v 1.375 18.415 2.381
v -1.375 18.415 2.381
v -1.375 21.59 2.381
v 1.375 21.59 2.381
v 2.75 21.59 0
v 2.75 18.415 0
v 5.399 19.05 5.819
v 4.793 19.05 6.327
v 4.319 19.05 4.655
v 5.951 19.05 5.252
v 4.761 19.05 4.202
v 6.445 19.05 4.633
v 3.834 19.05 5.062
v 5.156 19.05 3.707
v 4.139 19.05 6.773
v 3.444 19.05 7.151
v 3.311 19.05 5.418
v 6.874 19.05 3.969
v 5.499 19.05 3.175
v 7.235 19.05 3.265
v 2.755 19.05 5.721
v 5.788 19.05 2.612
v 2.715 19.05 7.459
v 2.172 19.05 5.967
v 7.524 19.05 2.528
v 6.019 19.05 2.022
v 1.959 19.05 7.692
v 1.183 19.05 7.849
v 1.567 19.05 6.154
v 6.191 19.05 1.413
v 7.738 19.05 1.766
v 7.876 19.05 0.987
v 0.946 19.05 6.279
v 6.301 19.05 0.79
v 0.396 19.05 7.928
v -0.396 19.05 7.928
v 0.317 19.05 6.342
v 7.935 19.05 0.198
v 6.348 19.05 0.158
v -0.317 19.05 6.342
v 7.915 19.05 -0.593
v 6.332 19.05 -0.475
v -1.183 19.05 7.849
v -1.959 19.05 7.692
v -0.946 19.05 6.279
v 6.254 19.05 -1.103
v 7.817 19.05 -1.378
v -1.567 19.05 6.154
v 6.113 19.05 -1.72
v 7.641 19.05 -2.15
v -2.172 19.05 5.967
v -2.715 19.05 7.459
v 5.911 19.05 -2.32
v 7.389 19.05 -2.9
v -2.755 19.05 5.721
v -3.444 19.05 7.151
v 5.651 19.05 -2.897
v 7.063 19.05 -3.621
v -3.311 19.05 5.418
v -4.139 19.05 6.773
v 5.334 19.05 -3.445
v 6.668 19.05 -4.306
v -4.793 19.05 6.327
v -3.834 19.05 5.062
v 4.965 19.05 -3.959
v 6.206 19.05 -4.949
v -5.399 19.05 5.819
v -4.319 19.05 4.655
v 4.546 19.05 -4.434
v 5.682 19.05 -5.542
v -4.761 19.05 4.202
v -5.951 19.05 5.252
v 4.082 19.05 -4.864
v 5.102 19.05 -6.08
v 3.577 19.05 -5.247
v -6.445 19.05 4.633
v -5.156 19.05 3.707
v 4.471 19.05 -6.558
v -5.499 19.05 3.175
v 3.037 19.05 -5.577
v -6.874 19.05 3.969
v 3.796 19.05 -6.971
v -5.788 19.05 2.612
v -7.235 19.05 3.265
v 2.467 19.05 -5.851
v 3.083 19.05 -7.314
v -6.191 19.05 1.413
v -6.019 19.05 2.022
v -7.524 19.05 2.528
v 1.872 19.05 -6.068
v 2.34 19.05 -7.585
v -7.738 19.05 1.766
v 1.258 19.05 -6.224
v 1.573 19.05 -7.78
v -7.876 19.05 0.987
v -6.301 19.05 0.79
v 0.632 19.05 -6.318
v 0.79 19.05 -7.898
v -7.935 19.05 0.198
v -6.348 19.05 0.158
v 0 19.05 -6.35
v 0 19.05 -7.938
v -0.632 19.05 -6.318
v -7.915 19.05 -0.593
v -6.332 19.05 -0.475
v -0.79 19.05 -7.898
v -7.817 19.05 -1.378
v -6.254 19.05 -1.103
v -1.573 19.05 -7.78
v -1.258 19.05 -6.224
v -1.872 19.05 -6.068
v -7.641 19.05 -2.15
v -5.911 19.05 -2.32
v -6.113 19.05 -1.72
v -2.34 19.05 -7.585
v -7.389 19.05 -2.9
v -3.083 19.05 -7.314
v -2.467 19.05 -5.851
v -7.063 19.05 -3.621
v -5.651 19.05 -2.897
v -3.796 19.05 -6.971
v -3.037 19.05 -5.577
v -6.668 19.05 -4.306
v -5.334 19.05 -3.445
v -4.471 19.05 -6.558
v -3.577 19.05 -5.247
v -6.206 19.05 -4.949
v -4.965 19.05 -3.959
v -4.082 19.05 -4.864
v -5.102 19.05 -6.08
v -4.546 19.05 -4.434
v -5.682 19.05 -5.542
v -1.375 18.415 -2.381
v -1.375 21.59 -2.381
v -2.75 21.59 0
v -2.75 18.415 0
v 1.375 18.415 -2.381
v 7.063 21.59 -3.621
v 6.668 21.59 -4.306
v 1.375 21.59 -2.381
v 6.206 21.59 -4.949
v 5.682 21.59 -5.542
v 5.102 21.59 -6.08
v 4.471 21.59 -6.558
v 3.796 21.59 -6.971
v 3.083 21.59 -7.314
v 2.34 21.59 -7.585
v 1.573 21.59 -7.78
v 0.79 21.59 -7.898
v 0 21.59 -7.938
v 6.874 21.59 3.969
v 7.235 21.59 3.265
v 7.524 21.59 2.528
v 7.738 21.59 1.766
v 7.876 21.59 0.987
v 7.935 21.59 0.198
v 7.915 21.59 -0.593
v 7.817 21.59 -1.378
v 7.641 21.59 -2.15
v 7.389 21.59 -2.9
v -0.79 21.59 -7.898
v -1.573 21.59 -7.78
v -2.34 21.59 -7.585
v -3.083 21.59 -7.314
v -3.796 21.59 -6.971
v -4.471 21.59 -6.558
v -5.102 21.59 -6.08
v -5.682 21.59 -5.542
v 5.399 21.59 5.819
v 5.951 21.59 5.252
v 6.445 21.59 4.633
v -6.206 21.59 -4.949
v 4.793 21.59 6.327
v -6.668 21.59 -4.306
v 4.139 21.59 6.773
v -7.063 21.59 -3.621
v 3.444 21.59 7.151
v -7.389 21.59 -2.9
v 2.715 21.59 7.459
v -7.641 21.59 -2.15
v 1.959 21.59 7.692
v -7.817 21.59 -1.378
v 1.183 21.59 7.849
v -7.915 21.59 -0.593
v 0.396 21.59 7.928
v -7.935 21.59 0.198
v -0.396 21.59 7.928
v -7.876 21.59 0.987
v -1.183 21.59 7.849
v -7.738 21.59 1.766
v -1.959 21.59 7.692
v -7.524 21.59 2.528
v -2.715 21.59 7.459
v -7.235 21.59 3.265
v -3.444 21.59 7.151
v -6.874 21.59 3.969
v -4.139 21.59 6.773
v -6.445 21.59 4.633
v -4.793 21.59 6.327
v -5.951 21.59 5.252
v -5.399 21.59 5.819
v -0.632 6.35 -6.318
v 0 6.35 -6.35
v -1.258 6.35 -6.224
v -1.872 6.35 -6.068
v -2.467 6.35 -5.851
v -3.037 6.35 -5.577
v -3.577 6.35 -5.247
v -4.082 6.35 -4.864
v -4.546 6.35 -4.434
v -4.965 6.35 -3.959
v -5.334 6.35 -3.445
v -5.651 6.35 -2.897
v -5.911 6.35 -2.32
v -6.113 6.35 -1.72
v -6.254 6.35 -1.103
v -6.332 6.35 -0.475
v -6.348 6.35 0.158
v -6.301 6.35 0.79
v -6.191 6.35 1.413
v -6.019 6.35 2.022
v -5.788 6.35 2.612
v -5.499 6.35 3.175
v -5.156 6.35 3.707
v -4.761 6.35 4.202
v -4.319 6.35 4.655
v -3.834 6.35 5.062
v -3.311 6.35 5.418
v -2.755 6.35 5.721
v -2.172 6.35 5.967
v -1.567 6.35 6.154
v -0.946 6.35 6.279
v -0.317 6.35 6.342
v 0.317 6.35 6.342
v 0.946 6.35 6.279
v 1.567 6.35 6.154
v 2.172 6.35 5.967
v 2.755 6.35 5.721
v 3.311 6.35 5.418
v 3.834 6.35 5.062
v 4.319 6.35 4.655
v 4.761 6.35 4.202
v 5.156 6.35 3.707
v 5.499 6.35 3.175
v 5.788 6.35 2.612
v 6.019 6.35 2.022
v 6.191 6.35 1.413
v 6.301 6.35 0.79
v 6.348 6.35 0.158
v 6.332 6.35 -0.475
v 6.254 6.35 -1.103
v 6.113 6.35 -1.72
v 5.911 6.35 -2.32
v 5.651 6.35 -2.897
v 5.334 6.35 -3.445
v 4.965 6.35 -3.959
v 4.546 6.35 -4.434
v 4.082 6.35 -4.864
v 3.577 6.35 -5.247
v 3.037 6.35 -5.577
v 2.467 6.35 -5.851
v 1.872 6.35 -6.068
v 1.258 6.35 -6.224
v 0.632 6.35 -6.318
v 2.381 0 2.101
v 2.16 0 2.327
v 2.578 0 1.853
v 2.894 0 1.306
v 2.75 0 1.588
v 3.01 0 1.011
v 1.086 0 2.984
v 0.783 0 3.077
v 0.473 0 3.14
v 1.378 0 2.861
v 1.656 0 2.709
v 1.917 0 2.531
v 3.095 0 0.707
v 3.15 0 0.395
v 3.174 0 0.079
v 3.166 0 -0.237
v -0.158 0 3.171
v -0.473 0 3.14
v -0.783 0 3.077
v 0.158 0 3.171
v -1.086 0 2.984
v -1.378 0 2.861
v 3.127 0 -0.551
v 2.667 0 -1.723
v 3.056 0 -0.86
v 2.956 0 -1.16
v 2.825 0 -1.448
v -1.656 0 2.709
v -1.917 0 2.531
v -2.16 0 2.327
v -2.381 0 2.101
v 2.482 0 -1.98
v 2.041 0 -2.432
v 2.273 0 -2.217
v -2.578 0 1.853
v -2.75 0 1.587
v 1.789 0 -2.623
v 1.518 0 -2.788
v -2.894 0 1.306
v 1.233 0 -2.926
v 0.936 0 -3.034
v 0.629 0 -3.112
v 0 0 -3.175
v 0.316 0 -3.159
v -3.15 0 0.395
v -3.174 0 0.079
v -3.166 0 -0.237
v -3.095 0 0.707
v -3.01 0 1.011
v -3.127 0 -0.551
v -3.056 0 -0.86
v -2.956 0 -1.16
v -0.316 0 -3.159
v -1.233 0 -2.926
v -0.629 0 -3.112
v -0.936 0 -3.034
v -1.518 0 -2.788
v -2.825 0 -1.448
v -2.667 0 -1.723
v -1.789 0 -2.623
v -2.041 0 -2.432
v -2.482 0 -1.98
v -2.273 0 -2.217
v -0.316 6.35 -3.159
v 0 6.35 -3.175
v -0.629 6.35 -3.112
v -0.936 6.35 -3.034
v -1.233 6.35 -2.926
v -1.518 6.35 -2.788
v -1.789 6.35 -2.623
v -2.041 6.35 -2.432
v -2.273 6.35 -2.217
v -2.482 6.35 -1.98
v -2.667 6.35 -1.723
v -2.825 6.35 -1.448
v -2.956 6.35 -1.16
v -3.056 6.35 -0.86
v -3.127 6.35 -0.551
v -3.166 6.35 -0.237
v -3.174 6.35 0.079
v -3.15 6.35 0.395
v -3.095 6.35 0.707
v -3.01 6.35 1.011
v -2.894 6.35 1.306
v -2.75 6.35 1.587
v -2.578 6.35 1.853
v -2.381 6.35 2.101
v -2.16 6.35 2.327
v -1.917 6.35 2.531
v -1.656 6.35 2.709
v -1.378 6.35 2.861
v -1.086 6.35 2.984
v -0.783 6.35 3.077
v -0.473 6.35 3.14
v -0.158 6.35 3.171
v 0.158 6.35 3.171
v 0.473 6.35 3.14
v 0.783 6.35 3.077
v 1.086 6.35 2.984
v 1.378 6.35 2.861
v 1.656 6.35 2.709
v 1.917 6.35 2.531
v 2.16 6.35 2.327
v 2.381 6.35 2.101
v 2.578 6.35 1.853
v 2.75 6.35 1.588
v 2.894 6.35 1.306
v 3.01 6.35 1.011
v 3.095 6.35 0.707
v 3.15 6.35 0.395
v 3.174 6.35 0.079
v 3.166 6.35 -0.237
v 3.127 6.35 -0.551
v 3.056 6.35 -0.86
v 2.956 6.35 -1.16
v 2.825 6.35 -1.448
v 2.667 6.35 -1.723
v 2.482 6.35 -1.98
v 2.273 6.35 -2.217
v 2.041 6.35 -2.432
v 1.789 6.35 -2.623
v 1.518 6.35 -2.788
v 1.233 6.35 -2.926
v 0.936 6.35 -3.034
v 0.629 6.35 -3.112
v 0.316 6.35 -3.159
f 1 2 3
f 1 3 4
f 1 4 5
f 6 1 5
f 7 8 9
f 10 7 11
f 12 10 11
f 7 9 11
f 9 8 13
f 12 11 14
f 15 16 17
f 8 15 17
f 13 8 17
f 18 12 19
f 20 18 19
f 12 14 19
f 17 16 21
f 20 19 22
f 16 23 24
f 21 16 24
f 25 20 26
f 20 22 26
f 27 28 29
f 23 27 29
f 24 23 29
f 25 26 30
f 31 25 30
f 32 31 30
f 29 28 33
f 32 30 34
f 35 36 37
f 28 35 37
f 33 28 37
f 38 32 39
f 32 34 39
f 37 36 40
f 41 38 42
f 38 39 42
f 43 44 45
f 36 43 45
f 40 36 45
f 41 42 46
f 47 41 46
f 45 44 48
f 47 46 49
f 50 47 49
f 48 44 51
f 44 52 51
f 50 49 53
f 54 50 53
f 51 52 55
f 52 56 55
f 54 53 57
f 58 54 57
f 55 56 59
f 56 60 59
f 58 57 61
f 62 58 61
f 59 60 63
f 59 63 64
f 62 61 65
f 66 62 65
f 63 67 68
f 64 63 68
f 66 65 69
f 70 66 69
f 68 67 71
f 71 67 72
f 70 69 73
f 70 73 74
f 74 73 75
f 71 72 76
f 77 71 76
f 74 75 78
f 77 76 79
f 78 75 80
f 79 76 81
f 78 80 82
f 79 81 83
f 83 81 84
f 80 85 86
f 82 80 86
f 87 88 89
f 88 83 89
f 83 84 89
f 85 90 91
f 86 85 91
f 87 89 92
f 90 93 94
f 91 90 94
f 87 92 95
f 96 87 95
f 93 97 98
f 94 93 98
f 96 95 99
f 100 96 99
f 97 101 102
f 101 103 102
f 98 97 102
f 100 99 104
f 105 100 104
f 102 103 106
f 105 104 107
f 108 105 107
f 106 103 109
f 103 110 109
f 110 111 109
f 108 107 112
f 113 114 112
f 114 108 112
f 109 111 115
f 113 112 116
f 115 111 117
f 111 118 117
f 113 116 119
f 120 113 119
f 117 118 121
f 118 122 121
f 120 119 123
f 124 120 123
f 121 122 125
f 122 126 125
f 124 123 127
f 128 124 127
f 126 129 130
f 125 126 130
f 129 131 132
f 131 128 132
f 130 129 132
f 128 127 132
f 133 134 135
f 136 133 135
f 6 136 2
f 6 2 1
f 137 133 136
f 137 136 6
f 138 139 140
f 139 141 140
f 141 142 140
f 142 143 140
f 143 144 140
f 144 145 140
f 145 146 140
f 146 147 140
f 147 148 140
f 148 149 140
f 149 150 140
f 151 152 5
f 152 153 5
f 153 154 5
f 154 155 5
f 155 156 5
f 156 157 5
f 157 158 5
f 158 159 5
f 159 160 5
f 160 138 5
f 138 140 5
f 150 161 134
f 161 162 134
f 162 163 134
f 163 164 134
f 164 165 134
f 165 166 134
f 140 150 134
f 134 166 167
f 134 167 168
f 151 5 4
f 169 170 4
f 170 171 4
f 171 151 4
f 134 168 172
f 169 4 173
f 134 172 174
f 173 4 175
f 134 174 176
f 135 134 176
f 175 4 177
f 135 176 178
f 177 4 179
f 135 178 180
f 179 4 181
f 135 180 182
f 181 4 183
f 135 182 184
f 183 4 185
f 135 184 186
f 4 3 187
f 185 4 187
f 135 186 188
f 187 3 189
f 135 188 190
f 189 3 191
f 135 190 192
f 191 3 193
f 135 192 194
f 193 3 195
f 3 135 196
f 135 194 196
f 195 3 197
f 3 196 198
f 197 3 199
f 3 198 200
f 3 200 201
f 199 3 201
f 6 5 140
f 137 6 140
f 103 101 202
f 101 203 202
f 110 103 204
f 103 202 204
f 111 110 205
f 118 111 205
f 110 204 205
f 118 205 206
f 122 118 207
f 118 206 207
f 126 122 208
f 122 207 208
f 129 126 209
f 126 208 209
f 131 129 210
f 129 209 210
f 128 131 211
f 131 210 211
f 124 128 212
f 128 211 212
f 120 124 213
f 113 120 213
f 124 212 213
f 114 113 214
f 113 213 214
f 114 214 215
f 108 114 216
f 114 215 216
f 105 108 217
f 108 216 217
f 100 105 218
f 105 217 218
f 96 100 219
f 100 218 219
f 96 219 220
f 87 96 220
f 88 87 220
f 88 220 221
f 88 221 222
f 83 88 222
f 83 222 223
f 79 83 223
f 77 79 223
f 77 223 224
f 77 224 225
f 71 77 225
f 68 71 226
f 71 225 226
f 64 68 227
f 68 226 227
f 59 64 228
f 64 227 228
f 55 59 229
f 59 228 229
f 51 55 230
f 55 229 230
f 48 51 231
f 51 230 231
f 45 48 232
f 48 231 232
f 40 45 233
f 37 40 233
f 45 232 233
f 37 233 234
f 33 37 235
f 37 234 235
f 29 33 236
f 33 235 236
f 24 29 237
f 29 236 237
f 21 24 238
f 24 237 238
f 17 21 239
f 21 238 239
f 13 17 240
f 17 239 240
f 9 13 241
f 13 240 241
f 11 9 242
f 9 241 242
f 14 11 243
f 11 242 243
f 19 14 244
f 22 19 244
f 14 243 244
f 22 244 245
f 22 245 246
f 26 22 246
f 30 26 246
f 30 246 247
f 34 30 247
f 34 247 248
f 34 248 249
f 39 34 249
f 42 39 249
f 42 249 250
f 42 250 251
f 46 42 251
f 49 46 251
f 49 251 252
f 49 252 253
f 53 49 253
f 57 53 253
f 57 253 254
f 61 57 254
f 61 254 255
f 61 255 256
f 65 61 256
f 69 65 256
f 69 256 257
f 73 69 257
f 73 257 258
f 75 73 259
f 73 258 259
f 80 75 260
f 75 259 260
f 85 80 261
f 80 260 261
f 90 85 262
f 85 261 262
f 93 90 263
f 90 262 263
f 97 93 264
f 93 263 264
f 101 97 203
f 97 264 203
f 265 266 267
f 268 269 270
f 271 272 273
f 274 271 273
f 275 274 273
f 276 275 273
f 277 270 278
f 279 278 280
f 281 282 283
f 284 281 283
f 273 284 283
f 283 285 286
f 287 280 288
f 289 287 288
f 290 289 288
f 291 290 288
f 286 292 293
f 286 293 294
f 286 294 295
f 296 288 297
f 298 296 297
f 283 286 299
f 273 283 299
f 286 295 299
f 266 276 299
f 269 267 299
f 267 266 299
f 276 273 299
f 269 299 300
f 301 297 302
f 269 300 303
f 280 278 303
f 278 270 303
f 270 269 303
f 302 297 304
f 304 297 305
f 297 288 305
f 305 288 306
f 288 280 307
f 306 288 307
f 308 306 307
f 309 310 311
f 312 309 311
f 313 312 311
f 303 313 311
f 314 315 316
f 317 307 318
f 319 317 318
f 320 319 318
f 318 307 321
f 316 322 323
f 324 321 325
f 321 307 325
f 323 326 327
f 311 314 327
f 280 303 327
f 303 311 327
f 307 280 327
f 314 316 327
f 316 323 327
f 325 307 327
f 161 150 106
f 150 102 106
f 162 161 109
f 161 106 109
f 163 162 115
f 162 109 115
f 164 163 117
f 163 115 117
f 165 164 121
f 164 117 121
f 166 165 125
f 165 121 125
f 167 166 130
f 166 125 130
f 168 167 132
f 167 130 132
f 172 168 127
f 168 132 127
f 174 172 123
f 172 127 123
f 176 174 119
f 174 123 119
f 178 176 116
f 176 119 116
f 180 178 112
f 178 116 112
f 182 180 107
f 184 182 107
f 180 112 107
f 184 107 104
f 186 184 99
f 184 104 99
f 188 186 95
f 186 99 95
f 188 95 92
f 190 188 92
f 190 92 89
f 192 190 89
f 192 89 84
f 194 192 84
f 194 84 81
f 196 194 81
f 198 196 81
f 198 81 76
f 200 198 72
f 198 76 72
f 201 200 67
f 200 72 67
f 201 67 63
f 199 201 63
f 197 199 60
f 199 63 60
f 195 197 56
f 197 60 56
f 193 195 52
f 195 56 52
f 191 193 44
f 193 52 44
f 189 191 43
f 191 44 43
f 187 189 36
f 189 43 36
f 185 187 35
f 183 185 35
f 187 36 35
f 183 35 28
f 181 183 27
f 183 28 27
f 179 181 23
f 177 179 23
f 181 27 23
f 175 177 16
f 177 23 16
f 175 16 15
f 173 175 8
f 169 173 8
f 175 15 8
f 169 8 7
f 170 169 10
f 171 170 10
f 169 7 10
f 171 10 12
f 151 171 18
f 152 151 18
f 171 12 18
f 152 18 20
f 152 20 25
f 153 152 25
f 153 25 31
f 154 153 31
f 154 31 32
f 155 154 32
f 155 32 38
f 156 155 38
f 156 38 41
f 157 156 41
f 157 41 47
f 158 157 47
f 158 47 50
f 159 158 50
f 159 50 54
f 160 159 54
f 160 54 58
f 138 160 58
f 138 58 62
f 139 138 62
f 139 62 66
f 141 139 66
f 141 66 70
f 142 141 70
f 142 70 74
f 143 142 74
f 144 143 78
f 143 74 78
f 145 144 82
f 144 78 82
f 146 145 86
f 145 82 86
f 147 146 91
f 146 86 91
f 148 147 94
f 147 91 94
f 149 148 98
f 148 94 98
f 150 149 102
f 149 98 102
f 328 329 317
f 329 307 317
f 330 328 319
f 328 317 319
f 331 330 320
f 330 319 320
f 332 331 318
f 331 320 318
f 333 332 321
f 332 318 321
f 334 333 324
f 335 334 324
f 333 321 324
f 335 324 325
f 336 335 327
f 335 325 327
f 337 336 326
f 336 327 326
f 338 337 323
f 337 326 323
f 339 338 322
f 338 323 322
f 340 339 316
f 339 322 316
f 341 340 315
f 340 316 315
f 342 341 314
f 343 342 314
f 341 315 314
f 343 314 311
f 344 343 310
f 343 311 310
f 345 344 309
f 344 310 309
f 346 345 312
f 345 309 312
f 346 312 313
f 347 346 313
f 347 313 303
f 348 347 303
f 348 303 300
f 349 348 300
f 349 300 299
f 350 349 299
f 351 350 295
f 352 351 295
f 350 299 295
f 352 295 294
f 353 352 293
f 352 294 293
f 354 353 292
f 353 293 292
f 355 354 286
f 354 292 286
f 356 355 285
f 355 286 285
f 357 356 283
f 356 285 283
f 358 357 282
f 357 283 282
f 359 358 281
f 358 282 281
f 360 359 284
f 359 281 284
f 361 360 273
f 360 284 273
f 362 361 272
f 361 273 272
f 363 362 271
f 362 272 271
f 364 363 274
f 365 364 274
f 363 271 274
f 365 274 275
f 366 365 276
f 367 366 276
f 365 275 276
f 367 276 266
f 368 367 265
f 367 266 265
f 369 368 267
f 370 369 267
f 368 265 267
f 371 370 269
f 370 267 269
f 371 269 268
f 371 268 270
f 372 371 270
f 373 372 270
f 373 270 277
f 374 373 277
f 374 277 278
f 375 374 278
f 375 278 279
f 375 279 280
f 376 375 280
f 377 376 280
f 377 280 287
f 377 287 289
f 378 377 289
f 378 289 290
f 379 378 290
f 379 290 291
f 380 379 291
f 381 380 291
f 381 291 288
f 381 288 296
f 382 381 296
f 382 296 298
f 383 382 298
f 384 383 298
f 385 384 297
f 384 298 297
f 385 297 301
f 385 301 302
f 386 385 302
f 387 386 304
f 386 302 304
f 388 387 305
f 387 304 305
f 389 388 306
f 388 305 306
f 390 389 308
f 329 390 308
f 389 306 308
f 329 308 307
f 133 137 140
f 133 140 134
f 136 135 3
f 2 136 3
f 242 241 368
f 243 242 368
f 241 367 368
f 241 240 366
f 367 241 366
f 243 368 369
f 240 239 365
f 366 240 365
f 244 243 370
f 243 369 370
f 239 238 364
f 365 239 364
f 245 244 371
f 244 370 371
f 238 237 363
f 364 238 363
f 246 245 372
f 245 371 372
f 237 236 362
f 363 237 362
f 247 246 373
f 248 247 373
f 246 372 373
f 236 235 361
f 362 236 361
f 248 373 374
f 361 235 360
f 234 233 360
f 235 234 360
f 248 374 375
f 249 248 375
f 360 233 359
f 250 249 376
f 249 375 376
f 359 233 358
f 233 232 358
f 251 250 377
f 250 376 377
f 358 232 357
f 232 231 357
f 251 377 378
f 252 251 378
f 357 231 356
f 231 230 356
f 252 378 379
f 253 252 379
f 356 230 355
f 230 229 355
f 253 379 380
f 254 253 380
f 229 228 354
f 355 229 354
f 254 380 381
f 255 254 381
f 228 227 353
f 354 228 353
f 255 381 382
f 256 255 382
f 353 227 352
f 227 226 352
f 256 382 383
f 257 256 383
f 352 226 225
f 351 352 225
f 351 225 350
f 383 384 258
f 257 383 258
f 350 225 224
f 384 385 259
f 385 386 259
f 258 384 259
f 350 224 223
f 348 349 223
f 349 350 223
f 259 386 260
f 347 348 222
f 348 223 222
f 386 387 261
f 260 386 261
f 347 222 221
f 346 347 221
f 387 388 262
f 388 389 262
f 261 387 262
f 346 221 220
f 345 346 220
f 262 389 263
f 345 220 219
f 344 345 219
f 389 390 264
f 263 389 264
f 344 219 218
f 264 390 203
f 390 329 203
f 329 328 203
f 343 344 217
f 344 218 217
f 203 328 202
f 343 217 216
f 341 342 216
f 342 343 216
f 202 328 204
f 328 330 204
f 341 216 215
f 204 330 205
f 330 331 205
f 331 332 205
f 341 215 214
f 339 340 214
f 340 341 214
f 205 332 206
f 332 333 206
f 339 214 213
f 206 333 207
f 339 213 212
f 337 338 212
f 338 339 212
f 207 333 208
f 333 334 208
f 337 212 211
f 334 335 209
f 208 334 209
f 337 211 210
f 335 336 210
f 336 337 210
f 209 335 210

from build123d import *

# Parameters (mm, degrees)
CUT_EXTRUDE1_DEPTH = 3.175


with BuildPart() as part:
    # Sketch1 → Revolve1 (revolve)
    with BuildSketch(Plane(origin=(0, 0, 0), x_dir=(0, 0, -1), z_dir=(1, 0, 0)), mode=Mode.PRIVATE) as revolve1_sk:
        Polygon((0, 0), (0, 21.59), (-7.9375, 21.59), (-7.9375, 19.05), (-6.35, 19.05), (-6.35, 6.35), (-3.175, 6.35), (-3.175, 0), align=None)
    revolve(revolve1_sk.sketch.rotate(Axis((0, 0, 0), (0, 1, 0)), 180), axis=Axis((0, 0, 0), (0, 1, 0)))

    # Sketch2 → Cut-Extrude1 (cut)
    with BuildSketch(Plane(origin=(0, 21.59, 0), x_dir=(1, 0, 0), z_dir=(0, 1, 0))):
        Polygon((-1.374815329, 2.38125), (-2.749630657, 0), (-1.374815329, -2.38125), (1.374815329, -2.38125), (2.749630657, 0), (1.374815329, 2.38125), align=None)
    extrude(amount=-CUT_EXTRUDE1_DEPTH, mode=Mode.SUBTRACT)


solid = part.part
